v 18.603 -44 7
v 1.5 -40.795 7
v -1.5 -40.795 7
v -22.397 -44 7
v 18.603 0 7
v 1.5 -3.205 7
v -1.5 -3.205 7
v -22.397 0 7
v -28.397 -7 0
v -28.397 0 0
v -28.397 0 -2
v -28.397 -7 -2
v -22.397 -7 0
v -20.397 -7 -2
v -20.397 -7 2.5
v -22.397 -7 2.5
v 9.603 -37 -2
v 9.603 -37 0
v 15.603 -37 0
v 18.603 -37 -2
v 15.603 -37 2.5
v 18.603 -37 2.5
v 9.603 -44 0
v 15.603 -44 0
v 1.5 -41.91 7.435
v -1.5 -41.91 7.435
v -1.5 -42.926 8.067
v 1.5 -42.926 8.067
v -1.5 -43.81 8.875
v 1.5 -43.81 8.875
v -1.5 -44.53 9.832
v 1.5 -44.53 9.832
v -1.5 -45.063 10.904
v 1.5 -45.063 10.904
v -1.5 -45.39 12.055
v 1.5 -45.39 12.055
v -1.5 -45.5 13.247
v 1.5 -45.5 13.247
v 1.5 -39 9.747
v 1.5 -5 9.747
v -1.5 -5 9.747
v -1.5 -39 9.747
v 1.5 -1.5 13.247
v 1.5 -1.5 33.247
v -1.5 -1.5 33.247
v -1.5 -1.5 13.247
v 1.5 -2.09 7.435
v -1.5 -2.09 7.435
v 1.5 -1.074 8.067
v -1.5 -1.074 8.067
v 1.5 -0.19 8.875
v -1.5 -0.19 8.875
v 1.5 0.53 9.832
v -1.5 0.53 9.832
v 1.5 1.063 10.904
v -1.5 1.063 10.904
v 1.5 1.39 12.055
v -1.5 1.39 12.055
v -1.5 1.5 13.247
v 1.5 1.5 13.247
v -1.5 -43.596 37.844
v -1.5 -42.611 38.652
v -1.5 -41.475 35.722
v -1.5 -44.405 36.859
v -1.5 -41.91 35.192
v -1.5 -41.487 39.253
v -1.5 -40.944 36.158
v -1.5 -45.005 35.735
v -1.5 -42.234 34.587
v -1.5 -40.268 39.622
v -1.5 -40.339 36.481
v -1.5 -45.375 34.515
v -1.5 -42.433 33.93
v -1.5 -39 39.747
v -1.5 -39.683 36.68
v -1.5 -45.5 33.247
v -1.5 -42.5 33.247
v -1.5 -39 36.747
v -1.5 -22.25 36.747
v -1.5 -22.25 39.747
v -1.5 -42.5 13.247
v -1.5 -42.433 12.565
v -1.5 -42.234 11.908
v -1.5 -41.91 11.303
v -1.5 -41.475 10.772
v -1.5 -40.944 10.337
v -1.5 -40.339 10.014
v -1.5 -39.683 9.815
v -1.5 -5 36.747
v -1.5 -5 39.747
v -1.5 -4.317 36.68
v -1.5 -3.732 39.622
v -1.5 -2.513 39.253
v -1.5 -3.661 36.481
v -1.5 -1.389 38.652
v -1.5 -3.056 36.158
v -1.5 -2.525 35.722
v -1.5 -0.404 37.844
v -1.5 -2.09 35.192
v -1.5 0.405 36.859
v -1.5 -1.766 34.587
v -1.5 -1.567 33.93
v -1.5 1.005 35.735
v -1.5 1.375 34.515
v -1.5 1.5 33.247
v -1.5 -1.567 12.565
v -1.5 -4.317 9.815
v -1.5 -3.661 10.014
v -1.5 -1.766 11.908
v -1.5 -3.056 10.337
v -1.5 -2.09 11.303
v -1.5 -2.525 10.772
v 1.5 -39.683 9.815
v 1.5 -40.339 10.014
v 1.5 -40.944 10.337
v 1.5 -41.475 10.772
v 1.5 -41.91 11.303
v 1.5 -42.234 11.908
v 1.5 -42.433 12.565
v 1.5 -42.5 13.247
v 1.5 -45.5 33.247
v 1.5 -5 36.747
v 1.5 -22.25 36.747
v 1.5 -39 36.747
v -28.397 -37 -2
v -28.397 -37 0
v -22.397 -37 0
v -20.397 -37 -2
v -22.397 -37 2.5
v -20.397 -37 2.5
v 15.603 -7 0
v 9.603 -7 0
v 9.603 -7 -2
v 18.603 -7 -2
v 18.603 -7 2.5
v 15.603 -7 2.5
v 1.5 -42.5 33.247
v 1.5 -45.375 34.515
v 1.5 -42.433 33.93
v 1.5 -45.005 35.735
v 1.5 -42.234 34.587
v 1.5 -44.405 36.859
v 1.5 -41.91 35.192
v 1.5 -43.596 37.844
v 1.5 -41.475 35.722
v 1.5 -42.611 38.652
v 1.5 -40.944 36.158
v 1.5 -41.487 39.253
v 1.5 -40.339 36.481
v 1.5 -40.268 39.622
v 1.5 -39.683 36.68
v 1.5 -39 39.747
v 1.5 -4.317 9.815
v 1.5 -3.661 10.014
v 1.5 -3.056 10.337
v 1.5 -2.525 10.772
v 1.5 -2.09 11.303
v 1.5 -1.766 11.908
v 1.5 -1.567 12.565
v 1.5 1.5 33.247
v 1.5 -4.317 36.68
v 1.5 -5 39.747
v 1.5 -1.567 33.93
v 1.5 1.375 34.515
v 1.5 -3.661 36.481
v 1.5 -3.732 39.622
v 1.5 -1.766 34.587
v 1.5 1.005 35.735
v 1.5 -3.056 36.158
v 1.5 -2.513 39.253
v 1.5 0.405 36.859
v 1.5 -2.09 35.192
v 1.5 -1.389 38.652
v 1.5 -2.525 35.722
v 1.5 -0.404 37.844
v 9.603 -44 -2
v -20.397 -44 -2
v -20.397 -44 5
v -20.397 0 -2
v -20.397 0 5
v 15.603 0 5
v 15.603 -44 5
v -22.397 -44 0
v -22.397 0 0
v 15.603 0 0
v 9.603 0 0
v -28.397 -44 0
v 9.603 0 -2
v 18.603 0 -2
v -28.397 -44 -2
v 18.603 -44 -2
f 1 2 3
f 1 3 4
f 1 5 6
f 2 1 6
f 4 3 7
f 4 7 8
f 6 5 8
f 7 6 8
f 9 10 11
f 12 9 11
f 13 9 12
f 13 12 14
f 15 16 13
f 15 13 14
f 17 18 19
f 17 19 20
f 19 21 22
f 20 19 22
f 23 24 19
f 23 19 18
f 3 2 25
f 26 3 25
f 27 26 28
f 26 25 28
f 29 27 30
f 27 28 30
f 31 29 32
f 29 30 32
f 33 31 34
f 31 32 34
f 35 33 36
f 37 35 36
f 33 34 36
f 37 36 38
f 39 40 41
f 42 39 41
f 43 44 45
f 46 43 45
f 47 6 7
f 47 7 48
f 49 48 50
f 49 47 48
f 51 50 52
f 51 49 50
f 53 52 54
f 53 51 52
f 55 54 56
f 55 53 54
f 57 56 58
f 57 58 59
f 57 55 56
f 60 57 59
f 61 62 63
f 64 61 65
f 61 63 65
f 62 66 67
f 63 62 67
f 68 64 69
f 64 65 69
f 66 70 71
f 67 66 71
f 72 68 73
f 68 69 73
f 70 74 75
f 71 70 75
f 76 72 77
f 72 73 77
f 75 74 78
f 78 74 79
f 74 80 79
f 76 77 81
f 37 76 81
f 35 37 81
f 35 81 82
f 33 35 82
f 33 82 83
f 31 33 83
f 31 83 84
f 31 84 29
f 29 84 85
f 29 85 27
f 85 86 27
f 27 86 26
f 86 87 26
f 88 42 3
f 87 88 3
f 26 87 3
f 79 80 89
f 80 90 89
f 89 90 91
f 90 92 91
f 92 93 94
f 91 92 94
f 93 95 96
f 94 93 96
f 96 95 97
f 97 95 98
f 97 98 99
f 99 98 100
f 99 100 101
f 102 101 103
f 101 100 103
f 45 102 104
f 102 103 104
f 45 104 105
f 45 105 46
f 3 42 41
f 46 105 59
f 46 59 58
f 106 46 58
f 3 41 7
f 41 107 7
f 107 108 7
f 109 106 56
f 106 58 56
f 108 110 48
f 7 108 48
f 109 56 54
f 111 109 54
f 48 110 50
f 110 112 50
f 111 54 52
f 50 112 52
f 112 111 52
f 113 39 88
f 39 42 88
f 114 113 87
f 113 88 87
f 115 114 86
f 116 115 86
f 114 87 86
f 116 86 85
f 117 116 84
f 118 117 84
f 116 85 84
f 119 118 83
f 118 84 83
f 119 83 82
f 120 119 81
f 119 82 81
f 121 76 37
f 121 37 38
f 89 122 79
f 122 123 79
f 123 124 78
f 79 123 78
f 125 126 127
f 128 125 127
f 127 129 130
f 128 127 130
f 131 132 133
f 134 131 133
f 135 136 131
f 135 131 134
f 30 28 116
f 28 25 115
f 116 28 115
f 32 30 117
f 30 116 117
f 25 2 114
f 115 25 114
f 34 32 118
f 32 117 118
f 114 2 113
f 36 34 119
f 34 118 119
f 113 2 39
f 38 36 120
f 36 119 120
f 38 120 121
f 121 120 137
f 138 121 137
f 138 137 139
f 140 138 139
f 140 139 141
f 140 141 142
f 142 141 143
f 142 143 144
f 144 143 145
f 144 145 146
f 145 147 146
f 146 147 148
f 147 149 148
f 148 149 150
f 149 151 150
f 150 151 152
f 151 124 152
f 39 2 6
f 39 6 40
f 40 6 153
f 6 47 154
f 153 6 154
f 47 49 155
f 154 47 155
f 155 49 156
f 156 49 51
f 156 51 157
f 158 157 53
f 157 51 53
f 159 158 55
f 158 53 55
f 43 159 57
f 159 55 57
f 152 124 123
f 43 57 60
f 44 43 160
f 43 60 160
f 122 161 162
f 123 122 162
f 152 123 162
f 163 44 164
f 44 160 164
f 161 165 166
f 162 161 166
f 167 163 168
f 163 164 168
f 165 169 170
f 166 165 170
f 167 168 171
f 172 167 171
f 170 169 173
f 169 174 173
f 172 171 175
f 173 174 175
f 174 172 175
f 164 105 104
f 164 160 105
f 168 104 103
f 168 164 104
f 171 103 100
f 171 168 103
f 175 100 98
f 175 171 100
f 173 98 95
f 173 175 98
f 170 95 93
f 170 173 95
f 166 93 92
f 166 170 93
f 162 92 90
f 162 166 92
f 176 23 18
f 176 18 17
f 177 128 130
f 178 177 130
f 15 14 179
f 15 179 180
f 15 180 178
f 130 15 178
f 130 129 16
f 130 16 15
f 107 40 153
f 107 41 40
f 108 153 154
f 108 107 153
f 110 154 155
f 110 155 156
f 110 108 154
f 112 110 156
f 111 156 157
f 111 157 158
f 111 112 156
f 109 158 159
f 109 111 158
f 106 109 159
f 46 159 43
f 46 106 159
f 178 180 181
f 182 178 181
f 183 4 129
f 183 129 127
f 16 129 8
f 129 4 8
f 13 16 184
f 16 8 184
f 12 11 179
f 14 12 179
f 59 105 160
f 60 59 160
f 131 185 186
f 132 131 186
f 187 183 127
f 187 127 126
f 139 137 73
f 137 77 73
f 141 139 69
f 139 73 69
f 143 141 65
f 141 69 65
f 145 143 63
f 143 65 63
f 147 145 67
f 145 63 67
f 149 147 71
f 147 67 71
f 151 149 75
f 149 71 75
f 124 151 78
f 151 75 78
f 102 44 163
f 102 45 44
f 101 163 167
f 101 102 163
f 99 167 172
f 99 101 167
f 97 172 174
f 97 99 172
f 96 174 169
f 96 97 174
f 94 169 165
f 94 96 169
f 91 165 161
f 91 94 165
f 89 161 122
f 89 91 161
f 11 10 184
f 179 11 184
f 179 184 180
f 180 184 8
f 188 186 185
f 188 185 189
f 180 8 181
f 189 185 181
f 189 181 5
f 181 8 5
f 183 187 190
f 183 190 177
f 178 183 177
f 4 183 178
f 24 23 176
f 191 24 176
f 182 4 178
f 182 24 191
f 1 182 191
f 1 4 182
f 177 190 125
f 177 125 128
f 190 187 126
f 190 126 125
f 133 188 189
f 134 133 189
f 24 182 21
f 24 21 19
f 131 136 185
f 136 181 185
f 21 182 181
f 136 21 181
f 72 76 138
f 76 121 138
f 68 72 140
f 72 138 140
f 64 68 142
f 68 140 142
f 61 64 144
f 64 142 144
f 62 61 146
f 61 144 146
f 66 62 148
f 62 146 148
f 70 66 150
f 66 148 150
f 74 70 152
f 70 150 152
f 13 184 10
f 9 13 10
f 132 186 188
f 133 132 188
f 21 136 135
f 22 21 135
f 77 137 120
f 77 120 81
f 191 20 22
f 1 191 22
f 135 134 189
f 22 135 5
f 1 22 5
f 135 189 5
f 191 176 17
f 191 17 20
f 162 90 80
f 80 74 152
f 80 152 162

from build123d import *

# Parameters (mm, degrees)
F1_DEPTH = 22
F2_W     = 2
F2_H     = 2.5
F2_W_2   = 3
F4_DEPTH = 15
F6_W     = 3
F6_H     = 3


with BuildPart() as f1:
    # F0 (on Front) → F1 (new body)
    with BuildSketch(Plane.XZ):
        Polygon((-22.3971781656, 0), (-28.3971781656, 0), (-28.3971781656, -2), (-20.3971781656, -2), (-20.3971781656, 5), (13.6028218344, 5), (15.6028218344, 5), (15.6028218344, 0), (9.6028218344, 0), (9.6028218344, -2), (18.6028218344, -2), (18.6028218344, 7), (-22.3971781656, 7), align=None)
    extrude(amount=F1_DEPTH)

    # F2 (on face) → F4 (cut)
    with BuildSketch(Plane.XZ.offset(22)):
        Polygon((-20.3971781656, 0), (-22.3971781656, 0), (-28.3971781656, 0), (-28.3971781656, -2), (-20.3971781656, -2), align=None)
        Polygon((18.6028218344, -2), (18.6028218344, 0), (15.6028218344, 0), (9.6028218344, 0), (9.6028218344, -2), align=None)
        with Locations((-21.3971781656, 1.25)):
            Rectangle(F2_W, F2_H)
        with Locations((17.1028218344, 1.25)):
            Rectangle(F2_W_2, F2_H)
    extrude(amount=-F4_DEPTH, mode=Mode.SUBTRACT)

    # F7: sweep along a path in F3
    with BuildLine(Plane.YZ) as f7_path:
        Line((-22.250123322, 8.247365728), (-5, 8.247365728))
        ThreePointArc((-5, 8.247365728), (-1.4644660941, 9.7118318221), (0, 13.247365728))
        Line((0, 13.247365728), (0, 33.247365728))
        ThreePointArc((0, 33.247365728), (-1.4644660941, 36.782899634), (-5, 38.247365728))
        Line((-5, 38.247365728), (-22.250123322, 38.247365728))
    # F6 (on offset) → F7 (sweep)
    with BuildSketch(Plane.XZ.offset(22)):
        with Locations((0, 8.247365728)):
            Rectangle(F6_W, F6_H)
    sweep(path=f7_path.line)

    # F8: F1 across plane


with BuildPart() as f1_1:
    add(f1.part)
    add(f1.part.mirror(Plane.XZ.offset(22)))


solid = f1_1.part
